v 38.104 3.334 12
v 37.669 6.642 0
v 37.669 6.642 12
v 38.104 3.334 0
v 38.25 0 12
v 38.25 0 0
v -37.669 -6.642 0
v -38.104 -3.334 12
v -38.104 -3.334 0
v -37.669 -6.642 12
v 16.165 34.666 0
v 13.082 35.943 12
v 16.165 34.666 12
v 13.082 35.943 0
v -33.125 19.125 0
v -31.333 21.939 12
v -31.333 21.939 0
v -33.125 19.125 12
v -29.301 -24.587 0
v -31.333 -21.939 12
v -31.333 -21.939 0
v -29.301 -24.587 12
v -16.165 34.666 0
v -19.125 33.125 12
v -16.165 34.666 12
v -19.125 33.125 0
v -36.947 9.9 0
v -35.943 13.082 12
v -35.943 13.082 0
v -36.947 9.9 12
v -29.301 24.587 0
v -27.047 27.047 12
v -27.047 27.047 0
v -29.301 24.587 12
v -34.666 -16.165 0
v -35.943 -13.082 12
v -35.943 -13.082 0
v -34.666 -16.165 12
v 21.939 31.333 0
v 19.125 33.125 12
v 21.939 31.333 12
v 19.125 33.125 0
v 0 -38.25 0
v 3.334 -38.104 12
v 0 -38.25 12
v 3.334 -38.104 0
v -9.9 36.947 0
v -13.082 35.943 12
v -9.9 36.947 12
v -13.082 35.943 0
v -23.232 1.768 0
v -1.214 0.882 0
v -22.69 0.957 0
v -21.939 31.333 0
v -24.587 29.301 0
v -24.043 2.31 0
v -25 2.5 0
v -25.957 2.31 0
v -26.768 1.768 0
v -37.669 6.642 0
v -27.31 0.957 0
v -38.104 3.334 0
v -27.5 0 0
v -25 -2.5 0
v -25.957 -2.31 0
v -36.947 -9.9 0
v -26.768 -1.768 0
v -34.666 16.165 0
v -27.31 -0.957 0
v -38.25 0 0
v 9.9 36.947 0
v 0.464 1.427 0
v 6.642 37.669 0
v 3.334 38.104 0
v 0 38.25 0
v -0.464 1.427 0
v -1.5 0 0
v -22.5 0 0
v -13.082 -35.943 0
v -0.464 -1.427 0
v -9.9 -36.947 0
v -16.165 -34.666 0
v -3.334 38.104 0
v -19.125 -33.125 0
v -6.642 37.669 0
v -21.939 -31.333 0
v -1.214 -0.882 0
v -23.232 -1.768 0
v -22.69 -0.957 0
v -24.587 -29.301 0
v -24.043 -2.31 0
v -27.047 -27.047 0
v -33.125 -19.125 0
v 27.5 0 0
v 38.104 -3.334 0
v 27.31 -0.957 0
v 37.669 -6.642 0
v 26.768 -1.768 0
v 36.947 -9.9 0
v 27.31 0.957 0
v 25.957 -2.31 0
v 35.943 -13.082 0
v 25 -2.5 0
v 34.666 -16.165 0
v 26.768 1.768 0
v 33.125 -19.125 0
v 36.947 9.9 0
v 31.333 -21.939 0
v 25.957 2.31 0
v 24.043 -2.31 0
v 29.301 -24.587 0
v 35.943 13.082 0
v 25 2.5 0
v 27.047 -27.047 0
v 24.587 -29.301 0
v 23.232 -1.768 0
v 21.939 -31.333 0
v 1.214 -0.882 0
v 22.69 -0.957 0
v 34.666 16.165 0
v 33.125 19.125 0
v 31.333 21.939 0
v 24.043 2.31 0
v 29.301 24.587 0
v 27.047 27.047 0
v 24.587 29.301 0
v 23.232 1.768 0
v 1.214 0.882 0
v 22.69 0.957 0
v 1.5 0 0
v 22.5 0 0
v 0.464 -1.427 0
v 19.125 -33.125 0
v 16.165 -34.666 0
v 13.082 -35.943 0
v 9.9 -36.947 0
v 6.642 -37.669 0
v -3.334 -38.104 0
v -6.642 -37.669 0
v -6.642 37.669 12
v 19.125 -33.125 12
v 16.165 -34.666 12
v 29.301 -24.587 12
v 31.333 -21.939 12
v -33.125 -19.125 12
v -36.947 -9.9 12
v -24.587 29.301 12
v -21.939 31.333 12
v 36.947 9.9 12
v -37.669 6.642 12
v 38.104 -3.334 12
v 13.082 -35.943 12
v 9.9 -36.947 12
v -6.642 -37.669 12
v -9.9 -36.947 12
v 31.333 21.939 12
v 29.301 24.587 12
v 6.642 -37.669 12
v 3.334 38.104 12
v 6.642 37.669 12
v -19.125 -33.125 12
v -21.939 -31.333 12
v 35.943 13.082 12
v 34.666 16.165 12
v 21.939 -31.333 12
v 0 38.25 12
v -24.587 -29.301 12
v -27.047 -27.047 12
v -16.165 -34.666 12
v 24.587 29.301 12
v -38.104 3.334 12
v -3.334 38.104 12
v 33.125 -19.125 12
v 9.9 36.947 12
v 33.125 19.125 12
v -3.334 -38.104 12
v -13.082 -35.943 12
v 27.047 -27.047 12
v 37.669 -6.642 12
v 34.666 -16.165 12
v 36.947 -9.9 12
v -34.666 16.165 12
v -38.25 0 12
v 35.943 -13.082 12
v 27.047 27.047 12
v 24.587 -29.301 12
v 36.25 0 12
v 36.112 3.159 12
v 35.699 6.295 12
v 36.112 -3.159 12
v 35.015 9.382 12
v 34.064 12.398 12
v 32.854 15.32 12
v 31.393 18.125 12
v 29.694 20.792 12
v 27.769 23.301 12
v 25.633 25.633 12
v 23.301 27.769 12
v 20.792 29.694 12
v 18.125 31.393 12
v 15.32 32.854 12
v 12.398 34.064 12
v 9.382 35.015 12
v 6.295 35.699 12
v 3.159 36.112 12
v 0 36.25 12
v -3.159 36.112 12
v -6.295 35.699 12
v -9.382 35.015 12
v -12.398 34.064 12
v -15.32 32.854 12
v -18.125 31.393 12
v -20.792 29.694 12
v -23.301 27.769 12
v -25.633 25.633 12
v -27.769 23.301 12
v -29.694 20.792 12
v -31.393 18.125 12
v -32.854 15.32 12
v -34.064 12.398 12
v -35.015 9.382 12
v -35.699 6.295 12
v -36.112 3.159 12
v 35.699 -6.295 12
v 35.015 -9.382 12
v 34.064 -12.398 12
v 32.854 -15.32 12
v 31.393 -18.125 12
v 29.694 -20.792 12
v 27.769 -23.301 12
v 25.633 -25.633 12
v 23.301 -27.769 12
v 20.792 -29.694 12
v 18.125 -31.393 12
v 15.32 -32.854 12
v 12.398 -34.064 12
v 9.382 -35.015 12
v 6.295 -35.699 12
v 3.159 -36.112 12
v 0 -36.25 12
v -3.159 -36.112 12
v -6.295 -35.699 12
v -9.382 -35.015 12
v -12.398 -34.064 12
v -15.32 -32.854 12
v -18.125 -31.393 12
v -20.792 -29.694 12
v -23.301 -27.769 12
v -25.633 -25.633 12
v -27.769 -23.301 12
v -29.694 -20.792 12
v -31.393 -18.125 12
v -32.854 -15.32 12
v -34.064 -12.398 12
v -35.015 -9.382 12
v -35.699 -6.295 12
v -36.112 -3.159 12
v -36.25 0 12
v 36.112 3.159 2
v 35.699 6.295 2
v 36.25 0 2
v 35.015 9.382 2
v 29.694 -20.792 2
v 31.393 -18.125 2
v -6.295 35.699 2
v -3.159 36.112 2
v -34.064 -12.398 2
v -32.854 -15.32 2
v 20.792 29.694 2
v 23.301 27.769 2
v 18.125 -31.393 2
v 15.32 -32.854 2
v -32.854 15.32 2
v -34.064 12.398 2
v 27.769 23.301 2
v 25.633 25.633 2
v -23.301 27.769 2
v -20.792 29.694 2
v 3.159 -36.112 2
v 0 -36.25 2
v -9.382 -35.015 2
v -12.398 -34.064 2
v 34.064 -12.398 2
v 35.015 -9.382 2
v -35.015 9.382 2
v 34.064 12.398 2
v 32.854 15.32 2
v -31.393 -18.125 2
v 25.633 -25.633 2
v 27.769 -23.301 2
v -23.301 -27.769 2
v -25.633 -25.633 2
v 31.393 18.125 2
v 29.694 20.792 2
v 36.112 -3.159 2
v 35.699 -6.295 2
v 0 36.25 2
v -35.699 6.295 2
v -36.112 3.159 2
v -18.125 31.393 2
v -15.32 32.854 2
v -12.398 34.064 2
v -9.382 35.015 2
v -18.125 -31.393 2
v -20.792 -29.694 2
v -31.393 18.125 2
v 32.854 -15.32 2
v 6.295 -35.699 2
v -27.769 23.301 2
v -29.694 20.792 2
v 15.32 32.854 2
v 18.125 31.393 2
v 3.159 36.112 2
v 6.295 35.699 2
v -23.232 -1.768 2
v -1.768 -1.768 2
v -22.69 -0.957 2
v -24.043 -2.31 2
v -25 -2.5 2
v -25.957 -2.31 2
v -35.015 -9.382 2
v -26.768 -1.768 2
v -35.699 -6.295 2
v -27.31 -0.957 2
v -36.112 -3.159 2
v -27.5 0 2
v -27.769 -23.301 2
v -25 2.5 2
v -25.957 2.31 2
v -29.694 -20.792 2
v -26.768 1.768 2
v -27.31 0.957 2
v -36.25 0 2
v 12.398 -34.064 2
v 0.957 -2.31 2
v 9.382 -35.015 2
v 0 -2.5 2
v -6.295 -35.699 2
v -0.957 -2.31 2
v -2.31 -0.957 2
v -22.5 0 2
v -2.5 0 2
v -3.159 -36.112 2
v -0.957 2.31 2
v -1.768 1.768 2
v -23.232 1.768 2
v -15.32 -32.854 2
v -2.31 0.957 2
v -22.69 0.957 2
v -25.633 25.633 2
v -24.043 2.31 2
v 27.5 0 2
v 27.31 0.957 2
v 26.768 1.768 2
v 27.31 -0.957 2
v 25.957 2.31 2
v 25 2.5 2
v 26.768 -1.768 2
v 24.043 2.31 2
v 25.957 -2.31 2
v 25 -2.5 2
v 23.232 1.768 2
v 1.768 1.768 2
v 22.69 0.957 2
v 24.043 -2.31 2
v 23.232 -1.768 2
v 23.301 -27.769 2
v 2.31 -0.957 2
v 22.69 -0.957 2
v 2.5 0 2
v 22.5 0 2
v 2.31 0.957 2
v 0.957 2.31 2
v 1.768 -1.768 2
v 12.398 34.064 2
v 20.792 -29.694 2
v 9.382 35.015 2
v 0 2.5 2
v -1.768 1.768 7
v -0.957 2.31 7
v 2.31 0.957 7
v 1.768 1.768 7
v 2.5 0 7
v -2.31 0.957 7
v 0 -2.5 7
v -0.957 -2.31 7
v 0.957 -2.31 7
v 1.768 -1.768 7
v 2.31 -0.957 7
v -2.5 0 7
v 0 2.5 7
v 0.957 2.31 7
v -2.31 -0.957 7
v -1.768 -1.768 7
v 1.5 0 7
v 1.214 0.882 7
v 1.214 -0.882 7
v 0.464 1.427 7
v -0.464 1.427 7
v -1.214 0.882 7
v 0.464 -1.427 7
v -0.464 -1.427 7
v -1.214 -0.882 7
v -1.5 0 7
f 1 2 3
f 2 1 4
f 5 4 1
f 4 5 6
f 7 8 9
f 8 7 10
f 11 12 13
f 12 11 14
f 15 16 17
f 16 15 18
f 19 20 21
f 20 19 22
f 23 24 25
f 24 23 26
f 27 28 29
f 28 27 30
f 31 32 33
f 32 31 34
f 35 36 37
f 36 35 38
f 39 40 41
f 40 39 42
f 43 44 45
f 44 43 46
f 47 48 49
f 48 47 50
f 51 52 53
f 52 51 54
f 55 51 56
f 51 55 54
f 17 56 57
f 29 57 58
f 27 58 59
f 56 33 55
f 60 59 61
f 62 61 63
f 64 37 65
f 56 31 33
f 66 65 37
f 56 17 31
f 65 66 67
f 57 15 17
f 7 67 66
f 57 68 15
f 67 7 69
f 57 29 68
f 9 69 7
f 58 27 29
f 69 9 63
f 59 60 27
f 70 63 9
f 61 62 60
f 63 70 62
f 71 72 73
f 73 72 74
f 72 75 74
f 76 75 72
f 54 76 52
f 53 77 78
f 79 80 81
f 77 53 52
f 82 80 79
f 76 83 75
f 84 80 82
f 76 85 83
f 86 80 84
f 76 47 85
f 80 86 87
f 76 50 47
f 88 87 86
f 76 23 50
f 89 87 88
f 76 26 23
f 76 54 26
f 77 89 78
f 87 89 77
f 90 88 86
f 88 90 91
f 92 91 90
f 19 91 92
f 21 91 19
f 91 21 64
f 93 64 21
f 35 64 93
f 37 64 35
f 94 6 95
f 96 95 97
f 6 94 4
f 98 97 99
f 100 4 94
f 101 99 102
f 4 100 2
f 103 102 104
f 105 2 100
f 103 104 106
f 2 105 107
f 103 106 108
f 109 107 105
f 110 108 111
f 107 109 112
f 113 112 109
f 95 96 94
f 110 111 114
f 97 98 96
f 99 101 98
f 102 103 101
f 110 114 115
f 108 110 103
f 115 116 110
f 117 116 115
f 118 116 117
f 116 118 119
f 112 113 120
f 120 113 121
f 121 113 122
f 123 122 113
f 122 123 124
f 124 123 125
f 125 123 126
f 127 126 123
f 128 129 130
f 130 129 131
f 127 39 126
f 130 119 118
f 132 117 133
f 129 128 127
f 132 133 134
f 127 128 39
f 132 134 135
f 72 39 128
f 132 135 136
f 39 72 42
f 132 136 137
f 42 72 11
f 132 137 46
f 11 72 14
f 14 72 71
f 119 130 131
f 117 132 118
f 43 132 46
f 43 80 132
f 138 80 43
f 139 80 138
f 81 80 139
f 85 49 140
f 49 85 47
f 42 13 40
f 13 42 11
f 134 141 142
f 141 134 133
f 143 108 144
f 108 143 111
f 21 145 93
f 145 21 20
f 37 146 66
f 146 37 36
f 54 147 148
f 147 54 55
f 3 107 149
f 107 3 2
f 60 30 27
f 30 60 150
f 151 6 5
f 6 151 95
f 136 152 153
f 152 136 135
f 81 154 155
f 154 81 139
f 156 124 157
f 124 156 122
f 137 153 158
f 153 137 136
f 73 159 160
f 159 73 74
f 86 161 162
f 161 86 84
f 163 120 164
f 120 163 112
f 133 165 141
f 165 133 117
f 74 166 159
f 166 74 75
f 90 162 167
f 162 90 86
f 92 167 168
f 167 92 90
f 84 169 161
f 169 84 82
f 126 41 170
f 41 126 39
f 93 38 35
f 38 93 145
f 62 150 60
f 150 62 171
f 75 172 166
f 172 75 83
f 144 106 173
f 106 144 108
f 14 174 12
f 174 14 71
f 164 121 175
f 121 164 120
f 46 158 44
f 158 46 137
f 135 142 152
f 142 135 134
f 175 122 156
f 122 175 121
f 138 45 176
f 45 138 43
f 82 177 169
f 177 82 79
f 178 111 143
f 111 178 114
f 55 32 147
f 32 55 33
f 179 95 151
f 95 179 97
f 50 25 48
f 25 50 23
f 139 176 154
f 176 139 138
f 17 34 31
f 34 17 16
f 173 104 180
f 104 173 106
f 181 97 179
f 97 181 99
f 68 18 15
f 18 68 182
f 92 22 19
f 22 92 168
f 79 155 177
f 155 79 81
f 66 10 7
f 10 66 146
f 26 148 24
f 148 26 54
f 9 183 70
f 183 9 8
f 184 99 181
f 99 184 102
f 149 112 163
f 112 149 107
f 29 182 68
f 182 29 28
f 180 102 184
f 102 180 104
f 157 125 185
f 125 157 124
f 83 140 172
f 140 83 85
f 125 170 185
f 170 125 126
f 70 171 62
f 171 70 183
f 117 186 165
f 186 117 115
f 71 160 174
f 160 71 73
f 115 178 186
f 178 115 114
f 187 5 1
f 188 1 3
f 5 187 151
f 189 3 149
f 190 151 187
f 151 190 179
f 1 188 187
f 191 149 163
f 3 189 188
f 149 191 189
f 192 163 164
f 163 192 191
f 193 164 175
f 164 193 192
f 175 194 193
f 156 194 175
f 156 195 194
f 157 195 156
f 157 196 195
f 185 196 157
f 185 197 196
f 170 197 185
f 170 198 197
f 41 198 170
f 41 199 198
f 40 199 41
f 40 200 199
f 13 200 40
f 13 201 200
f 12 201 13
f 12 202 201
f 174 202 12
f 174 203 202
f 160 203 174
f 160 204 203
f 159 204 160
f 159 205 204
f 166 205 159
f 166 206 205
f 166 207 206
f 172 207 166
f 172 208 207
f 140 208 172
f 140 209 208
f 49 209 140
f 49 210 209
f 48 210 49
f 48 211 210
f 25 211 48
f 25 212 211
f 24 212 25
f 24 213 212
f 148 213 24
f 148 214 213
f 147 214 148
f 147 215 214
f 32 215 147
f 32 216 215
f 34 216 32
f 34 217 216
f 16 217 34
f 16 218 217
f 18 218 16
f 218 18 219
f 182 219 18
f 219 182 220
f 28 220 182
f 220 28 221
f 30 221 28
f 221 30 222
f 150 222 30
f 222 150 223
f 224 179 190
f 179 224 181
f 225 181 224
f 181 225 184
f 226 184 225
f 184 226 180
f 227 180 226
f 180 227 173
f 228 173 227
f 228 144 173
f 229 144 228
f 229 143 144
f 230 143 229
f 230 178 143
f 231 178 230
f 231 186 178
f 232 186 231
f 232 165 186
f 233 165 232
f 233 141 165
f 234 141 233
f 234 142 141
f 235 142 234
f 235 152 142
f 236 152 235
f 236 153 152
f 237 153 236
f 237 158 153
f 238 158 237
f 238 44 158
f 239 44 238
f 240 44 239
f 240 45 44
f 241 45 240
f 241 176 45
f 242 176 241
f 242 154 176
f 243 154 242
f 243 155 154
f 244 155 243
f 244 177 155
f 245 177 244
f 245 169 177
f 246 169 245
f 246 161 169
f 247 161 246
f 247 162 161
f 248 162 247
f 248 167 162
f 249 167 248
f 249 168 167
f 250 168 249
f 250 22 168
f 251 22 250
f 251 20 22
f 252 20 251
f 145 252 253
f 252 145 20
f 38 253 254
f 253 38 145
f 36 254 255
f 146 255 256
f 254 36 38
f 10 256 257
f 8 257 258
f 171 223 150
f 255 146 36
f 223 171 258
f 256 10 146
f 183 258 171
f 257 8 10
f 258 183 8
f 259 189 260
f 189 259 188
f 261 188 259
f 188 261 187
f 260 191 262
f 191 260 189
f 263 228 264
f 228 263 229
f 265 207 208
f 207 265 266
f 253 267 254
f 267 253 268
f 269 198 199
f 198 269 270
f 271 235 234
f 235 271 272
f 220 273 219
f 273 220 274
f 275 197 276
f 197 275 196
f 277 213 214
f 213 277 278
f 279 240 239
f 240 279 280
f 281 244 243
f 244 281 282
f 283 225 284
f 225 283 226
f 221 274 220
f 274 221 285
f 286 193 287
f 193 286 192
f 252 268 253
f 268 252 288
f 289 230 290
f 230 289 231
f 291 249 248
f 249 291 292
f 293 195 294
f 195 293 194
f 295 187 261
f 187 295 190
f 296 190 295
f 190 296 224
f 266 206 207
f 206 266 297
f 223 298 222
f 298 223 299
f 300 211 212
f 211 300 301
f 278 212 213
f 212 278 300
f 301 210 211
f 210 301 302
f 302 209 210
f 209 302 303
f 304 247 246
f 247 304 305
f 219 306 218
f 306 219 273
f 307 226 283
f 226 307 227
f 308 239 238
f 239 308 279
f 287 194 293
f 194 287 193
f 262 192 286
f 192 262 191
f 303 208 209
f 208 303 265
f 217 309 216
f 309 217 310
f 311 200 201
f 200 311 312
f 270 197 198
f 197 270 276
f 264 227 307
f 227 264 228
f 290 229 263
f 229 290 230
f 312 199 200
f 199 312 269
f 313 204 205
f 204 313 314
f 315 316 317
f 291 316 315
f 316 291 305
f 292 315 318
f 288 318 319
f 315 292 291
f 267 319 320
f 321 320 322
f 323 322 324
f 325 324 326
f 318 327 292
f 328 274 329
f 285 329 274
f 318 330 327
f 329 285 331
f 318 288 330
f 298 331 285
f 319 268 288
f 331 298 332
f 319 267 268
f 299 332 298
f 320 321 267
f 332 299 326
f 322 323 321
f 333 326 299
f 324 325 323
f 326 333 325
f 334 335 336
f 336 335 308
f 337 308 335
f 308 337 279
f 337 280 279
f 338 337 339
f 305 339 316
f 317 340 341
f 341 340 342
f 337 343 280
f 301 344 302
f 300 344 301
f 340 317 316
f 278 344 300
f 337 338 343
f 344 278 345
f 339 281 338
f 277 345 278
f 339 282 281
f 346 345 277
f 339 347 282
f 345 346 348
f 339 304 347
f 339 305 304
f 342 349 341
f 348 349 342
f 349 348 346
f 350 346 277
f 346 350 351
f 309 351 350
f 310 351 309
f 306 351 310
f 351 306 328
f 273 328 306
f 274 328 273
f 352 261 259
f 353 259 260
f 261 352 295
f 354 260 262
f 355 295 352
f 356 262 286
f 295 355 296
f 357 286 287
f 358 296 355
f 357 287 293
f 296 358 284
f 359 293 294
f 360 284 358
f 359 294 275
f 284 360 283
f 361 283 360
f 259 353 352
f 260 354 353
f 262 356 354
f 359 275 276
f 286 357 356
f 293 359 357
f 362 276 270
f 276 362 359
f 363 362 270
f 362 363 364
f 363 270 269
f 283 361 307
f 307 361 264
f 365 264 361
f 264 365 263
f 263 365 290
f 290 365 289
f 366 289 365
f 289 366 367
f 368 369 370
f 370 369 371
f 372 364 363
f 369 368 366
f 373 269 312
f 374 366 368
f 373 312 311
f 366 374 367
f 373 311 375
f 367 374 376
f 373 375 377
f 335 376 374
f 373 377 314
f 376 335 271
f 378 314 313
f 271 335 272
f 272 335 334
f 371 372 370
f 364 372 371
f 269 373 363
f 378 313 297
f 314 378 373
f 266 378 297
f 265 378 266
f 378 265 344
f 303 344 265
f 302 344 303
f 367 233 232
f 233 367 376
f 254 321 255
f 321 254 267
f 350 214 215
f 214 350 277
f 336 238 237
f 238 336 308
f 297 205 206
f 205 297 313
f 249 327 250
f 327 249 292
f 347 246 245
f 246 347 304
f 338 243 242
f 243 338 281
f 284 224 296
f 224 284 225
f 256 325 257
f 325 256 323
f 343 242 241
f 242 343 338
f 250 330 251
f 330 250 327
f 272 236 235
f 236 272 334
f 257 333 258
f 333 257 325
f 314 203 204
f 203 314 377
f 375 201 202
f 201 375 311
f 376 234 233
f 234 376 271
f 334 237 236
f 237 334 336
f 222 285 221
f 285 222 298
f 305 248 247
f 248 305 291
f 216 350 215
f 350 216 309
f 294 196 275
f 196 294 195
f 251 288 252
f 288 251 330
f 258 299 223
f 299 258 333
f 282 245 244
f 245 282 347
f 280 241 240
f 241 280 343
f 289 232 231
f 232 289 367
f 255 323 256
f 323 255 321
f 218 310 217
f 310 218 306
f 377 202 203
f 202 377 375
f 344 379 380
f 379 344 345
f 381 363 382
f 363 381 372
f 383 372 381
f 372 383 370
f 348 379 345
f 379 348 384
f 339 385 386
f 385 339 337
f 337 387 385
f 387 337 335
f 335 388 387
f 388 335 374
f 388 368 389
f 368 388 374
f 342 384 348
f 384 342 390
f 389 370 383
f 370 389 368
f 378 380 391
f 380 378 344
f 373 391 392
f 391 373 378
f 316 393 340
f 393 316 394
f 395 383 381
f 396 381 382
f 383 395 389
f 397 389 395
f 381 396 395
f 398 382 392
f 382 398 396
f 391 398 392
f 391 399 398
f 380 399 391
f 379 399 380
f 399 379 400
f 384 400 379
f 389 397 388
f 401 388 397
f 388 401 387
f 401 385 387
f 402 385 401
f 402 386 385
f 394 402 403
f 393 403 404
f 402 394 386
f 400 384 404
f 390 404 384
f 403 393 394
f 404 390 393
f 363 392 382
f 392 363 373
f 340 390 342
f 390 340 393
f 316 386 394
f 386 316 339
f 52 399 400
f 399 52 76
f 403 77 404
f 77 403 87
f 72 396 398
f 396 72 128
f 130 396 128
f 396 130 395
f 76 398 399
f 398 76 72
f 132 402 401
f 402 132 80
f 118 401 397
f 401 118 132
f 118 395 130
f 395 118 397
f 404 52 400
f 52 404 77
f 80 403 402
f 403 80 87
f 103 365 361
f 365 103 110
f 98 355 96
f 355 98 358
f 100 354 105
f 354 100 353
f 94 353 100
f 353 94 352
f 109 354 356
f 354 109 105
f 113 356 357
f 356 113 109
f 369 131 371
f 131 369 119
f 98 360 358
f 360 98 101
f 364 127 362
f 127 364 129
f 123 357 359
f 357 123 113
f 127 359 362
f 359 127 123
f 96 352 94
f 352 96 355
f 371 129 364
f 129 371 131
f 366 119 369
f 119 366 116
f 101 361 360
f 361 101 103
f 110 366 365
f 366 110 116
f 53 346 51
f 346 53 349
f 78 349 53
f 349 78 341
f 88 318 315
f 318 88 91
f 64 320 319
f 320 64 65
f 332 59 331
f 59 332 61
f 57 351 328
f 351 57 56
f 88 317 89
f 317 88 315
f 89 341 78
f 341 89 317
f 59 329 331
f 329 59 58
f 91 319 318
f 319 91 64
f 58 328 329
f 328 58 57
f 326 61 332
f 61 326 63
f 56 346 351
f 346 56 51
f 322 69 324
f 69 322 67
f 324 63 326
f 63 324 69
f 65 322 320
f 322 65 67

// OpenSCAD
// internet-button-case.scad
//
// generates an l-bracket from the given parameters


// Copyright (c) 2015, Patrick Barrett
// All rights reserved.
//
// Redistribution and use in source and binary forms, with or without
// modification, are permitted provided that the following conditions are met:
//
// 1. Redistributions of source code must retain the above copyright notice,
// this list of conditions and the following disclaimer.
//
// 2. Redistributions in binary form must reproduce the above copyright notice,
// this list of conditions and the following disclaimer in the documentation
// and/or other materials provided with the distribution.
//
// THIS SOFTWARE IS PROVIDED BY THE COPYRIGHT HOLDERS AND CONTRIBUTORS "AS IS"
// AND ANY EXPRESS OR IMPLIED WARRANTIES, INCLUDING, BUT NOT LIMITED TO, THE
// IMPLIED WARRANTIES OF MERCHANTABILITY AND FITNESS FOR A PARTICULAR PURPOSE
// ARE DISCLAIMED. IN NO EVENT SHALL THE COPYRIGHT HOLDER OR CONTRIBUTORS BE
// LIABLE FOR ANY DIRECT, INDIRECT, INCIDENTAL, SPECIAL, EXEMPLARY, OR
// CONSEQUENTIAL DAMAGES (INCLUDING, BUT NOT LIMITED TO, PROCUREMENT OF
// SUBSTITUTE GOODS OR SERVICES; LOSS OF USE, DATA, OR PROFITS; OR BUSINESS
// INTERRUPTION) HOWEVER CAUSED AND ON ANY THEORY OF LIABILITY, WHETHER IN
// CONTRACT, STRICT LIABILITY, OR TORT (INCLUDING NEGLIGENCE OR OTHERWISE)
// ARISING IN ANY WAY OUT OF THE USE OF THIS SOFTWARE, EVEN IF ADVISED OF THE
// POSSIBILITY OF SUCH DAMAGE.

wall_thickness = 2;
internal_diameter = 72.5;
internal_depth = 10;

boss_diameter = 5;
boss_height = 5;
boss_internal_diameter = 3;

screw_hole_diameter = 5;

$fs = 1;
$fa = 5;

// customizable variables end here

abit = 0.000001;
alot = 10000000;

difference() {
    union() {
        difference() {
            cylinder(h = internal_depth + wall_thickness,
                     d = internal_diameter +  wall_thickness*2);
            translate([0,0,wall_thickness])
                cylinder(h = alot, d = internal_diameter);
        }
        translate([0,0,wall_thickness-abit])
            cylinder(h = boss_height, d = boss_diameter);
    }
    translate([0,0,-5])
        cylinder(h = 20, d = boss_internal_diameter);
    translate([25,0,-5])
        cylinder(h = alot, d = screw_hole_diameter);
    translate([-25,0,-5])
        cylinder(h = alot, d = screw_hole_diameter);
}
